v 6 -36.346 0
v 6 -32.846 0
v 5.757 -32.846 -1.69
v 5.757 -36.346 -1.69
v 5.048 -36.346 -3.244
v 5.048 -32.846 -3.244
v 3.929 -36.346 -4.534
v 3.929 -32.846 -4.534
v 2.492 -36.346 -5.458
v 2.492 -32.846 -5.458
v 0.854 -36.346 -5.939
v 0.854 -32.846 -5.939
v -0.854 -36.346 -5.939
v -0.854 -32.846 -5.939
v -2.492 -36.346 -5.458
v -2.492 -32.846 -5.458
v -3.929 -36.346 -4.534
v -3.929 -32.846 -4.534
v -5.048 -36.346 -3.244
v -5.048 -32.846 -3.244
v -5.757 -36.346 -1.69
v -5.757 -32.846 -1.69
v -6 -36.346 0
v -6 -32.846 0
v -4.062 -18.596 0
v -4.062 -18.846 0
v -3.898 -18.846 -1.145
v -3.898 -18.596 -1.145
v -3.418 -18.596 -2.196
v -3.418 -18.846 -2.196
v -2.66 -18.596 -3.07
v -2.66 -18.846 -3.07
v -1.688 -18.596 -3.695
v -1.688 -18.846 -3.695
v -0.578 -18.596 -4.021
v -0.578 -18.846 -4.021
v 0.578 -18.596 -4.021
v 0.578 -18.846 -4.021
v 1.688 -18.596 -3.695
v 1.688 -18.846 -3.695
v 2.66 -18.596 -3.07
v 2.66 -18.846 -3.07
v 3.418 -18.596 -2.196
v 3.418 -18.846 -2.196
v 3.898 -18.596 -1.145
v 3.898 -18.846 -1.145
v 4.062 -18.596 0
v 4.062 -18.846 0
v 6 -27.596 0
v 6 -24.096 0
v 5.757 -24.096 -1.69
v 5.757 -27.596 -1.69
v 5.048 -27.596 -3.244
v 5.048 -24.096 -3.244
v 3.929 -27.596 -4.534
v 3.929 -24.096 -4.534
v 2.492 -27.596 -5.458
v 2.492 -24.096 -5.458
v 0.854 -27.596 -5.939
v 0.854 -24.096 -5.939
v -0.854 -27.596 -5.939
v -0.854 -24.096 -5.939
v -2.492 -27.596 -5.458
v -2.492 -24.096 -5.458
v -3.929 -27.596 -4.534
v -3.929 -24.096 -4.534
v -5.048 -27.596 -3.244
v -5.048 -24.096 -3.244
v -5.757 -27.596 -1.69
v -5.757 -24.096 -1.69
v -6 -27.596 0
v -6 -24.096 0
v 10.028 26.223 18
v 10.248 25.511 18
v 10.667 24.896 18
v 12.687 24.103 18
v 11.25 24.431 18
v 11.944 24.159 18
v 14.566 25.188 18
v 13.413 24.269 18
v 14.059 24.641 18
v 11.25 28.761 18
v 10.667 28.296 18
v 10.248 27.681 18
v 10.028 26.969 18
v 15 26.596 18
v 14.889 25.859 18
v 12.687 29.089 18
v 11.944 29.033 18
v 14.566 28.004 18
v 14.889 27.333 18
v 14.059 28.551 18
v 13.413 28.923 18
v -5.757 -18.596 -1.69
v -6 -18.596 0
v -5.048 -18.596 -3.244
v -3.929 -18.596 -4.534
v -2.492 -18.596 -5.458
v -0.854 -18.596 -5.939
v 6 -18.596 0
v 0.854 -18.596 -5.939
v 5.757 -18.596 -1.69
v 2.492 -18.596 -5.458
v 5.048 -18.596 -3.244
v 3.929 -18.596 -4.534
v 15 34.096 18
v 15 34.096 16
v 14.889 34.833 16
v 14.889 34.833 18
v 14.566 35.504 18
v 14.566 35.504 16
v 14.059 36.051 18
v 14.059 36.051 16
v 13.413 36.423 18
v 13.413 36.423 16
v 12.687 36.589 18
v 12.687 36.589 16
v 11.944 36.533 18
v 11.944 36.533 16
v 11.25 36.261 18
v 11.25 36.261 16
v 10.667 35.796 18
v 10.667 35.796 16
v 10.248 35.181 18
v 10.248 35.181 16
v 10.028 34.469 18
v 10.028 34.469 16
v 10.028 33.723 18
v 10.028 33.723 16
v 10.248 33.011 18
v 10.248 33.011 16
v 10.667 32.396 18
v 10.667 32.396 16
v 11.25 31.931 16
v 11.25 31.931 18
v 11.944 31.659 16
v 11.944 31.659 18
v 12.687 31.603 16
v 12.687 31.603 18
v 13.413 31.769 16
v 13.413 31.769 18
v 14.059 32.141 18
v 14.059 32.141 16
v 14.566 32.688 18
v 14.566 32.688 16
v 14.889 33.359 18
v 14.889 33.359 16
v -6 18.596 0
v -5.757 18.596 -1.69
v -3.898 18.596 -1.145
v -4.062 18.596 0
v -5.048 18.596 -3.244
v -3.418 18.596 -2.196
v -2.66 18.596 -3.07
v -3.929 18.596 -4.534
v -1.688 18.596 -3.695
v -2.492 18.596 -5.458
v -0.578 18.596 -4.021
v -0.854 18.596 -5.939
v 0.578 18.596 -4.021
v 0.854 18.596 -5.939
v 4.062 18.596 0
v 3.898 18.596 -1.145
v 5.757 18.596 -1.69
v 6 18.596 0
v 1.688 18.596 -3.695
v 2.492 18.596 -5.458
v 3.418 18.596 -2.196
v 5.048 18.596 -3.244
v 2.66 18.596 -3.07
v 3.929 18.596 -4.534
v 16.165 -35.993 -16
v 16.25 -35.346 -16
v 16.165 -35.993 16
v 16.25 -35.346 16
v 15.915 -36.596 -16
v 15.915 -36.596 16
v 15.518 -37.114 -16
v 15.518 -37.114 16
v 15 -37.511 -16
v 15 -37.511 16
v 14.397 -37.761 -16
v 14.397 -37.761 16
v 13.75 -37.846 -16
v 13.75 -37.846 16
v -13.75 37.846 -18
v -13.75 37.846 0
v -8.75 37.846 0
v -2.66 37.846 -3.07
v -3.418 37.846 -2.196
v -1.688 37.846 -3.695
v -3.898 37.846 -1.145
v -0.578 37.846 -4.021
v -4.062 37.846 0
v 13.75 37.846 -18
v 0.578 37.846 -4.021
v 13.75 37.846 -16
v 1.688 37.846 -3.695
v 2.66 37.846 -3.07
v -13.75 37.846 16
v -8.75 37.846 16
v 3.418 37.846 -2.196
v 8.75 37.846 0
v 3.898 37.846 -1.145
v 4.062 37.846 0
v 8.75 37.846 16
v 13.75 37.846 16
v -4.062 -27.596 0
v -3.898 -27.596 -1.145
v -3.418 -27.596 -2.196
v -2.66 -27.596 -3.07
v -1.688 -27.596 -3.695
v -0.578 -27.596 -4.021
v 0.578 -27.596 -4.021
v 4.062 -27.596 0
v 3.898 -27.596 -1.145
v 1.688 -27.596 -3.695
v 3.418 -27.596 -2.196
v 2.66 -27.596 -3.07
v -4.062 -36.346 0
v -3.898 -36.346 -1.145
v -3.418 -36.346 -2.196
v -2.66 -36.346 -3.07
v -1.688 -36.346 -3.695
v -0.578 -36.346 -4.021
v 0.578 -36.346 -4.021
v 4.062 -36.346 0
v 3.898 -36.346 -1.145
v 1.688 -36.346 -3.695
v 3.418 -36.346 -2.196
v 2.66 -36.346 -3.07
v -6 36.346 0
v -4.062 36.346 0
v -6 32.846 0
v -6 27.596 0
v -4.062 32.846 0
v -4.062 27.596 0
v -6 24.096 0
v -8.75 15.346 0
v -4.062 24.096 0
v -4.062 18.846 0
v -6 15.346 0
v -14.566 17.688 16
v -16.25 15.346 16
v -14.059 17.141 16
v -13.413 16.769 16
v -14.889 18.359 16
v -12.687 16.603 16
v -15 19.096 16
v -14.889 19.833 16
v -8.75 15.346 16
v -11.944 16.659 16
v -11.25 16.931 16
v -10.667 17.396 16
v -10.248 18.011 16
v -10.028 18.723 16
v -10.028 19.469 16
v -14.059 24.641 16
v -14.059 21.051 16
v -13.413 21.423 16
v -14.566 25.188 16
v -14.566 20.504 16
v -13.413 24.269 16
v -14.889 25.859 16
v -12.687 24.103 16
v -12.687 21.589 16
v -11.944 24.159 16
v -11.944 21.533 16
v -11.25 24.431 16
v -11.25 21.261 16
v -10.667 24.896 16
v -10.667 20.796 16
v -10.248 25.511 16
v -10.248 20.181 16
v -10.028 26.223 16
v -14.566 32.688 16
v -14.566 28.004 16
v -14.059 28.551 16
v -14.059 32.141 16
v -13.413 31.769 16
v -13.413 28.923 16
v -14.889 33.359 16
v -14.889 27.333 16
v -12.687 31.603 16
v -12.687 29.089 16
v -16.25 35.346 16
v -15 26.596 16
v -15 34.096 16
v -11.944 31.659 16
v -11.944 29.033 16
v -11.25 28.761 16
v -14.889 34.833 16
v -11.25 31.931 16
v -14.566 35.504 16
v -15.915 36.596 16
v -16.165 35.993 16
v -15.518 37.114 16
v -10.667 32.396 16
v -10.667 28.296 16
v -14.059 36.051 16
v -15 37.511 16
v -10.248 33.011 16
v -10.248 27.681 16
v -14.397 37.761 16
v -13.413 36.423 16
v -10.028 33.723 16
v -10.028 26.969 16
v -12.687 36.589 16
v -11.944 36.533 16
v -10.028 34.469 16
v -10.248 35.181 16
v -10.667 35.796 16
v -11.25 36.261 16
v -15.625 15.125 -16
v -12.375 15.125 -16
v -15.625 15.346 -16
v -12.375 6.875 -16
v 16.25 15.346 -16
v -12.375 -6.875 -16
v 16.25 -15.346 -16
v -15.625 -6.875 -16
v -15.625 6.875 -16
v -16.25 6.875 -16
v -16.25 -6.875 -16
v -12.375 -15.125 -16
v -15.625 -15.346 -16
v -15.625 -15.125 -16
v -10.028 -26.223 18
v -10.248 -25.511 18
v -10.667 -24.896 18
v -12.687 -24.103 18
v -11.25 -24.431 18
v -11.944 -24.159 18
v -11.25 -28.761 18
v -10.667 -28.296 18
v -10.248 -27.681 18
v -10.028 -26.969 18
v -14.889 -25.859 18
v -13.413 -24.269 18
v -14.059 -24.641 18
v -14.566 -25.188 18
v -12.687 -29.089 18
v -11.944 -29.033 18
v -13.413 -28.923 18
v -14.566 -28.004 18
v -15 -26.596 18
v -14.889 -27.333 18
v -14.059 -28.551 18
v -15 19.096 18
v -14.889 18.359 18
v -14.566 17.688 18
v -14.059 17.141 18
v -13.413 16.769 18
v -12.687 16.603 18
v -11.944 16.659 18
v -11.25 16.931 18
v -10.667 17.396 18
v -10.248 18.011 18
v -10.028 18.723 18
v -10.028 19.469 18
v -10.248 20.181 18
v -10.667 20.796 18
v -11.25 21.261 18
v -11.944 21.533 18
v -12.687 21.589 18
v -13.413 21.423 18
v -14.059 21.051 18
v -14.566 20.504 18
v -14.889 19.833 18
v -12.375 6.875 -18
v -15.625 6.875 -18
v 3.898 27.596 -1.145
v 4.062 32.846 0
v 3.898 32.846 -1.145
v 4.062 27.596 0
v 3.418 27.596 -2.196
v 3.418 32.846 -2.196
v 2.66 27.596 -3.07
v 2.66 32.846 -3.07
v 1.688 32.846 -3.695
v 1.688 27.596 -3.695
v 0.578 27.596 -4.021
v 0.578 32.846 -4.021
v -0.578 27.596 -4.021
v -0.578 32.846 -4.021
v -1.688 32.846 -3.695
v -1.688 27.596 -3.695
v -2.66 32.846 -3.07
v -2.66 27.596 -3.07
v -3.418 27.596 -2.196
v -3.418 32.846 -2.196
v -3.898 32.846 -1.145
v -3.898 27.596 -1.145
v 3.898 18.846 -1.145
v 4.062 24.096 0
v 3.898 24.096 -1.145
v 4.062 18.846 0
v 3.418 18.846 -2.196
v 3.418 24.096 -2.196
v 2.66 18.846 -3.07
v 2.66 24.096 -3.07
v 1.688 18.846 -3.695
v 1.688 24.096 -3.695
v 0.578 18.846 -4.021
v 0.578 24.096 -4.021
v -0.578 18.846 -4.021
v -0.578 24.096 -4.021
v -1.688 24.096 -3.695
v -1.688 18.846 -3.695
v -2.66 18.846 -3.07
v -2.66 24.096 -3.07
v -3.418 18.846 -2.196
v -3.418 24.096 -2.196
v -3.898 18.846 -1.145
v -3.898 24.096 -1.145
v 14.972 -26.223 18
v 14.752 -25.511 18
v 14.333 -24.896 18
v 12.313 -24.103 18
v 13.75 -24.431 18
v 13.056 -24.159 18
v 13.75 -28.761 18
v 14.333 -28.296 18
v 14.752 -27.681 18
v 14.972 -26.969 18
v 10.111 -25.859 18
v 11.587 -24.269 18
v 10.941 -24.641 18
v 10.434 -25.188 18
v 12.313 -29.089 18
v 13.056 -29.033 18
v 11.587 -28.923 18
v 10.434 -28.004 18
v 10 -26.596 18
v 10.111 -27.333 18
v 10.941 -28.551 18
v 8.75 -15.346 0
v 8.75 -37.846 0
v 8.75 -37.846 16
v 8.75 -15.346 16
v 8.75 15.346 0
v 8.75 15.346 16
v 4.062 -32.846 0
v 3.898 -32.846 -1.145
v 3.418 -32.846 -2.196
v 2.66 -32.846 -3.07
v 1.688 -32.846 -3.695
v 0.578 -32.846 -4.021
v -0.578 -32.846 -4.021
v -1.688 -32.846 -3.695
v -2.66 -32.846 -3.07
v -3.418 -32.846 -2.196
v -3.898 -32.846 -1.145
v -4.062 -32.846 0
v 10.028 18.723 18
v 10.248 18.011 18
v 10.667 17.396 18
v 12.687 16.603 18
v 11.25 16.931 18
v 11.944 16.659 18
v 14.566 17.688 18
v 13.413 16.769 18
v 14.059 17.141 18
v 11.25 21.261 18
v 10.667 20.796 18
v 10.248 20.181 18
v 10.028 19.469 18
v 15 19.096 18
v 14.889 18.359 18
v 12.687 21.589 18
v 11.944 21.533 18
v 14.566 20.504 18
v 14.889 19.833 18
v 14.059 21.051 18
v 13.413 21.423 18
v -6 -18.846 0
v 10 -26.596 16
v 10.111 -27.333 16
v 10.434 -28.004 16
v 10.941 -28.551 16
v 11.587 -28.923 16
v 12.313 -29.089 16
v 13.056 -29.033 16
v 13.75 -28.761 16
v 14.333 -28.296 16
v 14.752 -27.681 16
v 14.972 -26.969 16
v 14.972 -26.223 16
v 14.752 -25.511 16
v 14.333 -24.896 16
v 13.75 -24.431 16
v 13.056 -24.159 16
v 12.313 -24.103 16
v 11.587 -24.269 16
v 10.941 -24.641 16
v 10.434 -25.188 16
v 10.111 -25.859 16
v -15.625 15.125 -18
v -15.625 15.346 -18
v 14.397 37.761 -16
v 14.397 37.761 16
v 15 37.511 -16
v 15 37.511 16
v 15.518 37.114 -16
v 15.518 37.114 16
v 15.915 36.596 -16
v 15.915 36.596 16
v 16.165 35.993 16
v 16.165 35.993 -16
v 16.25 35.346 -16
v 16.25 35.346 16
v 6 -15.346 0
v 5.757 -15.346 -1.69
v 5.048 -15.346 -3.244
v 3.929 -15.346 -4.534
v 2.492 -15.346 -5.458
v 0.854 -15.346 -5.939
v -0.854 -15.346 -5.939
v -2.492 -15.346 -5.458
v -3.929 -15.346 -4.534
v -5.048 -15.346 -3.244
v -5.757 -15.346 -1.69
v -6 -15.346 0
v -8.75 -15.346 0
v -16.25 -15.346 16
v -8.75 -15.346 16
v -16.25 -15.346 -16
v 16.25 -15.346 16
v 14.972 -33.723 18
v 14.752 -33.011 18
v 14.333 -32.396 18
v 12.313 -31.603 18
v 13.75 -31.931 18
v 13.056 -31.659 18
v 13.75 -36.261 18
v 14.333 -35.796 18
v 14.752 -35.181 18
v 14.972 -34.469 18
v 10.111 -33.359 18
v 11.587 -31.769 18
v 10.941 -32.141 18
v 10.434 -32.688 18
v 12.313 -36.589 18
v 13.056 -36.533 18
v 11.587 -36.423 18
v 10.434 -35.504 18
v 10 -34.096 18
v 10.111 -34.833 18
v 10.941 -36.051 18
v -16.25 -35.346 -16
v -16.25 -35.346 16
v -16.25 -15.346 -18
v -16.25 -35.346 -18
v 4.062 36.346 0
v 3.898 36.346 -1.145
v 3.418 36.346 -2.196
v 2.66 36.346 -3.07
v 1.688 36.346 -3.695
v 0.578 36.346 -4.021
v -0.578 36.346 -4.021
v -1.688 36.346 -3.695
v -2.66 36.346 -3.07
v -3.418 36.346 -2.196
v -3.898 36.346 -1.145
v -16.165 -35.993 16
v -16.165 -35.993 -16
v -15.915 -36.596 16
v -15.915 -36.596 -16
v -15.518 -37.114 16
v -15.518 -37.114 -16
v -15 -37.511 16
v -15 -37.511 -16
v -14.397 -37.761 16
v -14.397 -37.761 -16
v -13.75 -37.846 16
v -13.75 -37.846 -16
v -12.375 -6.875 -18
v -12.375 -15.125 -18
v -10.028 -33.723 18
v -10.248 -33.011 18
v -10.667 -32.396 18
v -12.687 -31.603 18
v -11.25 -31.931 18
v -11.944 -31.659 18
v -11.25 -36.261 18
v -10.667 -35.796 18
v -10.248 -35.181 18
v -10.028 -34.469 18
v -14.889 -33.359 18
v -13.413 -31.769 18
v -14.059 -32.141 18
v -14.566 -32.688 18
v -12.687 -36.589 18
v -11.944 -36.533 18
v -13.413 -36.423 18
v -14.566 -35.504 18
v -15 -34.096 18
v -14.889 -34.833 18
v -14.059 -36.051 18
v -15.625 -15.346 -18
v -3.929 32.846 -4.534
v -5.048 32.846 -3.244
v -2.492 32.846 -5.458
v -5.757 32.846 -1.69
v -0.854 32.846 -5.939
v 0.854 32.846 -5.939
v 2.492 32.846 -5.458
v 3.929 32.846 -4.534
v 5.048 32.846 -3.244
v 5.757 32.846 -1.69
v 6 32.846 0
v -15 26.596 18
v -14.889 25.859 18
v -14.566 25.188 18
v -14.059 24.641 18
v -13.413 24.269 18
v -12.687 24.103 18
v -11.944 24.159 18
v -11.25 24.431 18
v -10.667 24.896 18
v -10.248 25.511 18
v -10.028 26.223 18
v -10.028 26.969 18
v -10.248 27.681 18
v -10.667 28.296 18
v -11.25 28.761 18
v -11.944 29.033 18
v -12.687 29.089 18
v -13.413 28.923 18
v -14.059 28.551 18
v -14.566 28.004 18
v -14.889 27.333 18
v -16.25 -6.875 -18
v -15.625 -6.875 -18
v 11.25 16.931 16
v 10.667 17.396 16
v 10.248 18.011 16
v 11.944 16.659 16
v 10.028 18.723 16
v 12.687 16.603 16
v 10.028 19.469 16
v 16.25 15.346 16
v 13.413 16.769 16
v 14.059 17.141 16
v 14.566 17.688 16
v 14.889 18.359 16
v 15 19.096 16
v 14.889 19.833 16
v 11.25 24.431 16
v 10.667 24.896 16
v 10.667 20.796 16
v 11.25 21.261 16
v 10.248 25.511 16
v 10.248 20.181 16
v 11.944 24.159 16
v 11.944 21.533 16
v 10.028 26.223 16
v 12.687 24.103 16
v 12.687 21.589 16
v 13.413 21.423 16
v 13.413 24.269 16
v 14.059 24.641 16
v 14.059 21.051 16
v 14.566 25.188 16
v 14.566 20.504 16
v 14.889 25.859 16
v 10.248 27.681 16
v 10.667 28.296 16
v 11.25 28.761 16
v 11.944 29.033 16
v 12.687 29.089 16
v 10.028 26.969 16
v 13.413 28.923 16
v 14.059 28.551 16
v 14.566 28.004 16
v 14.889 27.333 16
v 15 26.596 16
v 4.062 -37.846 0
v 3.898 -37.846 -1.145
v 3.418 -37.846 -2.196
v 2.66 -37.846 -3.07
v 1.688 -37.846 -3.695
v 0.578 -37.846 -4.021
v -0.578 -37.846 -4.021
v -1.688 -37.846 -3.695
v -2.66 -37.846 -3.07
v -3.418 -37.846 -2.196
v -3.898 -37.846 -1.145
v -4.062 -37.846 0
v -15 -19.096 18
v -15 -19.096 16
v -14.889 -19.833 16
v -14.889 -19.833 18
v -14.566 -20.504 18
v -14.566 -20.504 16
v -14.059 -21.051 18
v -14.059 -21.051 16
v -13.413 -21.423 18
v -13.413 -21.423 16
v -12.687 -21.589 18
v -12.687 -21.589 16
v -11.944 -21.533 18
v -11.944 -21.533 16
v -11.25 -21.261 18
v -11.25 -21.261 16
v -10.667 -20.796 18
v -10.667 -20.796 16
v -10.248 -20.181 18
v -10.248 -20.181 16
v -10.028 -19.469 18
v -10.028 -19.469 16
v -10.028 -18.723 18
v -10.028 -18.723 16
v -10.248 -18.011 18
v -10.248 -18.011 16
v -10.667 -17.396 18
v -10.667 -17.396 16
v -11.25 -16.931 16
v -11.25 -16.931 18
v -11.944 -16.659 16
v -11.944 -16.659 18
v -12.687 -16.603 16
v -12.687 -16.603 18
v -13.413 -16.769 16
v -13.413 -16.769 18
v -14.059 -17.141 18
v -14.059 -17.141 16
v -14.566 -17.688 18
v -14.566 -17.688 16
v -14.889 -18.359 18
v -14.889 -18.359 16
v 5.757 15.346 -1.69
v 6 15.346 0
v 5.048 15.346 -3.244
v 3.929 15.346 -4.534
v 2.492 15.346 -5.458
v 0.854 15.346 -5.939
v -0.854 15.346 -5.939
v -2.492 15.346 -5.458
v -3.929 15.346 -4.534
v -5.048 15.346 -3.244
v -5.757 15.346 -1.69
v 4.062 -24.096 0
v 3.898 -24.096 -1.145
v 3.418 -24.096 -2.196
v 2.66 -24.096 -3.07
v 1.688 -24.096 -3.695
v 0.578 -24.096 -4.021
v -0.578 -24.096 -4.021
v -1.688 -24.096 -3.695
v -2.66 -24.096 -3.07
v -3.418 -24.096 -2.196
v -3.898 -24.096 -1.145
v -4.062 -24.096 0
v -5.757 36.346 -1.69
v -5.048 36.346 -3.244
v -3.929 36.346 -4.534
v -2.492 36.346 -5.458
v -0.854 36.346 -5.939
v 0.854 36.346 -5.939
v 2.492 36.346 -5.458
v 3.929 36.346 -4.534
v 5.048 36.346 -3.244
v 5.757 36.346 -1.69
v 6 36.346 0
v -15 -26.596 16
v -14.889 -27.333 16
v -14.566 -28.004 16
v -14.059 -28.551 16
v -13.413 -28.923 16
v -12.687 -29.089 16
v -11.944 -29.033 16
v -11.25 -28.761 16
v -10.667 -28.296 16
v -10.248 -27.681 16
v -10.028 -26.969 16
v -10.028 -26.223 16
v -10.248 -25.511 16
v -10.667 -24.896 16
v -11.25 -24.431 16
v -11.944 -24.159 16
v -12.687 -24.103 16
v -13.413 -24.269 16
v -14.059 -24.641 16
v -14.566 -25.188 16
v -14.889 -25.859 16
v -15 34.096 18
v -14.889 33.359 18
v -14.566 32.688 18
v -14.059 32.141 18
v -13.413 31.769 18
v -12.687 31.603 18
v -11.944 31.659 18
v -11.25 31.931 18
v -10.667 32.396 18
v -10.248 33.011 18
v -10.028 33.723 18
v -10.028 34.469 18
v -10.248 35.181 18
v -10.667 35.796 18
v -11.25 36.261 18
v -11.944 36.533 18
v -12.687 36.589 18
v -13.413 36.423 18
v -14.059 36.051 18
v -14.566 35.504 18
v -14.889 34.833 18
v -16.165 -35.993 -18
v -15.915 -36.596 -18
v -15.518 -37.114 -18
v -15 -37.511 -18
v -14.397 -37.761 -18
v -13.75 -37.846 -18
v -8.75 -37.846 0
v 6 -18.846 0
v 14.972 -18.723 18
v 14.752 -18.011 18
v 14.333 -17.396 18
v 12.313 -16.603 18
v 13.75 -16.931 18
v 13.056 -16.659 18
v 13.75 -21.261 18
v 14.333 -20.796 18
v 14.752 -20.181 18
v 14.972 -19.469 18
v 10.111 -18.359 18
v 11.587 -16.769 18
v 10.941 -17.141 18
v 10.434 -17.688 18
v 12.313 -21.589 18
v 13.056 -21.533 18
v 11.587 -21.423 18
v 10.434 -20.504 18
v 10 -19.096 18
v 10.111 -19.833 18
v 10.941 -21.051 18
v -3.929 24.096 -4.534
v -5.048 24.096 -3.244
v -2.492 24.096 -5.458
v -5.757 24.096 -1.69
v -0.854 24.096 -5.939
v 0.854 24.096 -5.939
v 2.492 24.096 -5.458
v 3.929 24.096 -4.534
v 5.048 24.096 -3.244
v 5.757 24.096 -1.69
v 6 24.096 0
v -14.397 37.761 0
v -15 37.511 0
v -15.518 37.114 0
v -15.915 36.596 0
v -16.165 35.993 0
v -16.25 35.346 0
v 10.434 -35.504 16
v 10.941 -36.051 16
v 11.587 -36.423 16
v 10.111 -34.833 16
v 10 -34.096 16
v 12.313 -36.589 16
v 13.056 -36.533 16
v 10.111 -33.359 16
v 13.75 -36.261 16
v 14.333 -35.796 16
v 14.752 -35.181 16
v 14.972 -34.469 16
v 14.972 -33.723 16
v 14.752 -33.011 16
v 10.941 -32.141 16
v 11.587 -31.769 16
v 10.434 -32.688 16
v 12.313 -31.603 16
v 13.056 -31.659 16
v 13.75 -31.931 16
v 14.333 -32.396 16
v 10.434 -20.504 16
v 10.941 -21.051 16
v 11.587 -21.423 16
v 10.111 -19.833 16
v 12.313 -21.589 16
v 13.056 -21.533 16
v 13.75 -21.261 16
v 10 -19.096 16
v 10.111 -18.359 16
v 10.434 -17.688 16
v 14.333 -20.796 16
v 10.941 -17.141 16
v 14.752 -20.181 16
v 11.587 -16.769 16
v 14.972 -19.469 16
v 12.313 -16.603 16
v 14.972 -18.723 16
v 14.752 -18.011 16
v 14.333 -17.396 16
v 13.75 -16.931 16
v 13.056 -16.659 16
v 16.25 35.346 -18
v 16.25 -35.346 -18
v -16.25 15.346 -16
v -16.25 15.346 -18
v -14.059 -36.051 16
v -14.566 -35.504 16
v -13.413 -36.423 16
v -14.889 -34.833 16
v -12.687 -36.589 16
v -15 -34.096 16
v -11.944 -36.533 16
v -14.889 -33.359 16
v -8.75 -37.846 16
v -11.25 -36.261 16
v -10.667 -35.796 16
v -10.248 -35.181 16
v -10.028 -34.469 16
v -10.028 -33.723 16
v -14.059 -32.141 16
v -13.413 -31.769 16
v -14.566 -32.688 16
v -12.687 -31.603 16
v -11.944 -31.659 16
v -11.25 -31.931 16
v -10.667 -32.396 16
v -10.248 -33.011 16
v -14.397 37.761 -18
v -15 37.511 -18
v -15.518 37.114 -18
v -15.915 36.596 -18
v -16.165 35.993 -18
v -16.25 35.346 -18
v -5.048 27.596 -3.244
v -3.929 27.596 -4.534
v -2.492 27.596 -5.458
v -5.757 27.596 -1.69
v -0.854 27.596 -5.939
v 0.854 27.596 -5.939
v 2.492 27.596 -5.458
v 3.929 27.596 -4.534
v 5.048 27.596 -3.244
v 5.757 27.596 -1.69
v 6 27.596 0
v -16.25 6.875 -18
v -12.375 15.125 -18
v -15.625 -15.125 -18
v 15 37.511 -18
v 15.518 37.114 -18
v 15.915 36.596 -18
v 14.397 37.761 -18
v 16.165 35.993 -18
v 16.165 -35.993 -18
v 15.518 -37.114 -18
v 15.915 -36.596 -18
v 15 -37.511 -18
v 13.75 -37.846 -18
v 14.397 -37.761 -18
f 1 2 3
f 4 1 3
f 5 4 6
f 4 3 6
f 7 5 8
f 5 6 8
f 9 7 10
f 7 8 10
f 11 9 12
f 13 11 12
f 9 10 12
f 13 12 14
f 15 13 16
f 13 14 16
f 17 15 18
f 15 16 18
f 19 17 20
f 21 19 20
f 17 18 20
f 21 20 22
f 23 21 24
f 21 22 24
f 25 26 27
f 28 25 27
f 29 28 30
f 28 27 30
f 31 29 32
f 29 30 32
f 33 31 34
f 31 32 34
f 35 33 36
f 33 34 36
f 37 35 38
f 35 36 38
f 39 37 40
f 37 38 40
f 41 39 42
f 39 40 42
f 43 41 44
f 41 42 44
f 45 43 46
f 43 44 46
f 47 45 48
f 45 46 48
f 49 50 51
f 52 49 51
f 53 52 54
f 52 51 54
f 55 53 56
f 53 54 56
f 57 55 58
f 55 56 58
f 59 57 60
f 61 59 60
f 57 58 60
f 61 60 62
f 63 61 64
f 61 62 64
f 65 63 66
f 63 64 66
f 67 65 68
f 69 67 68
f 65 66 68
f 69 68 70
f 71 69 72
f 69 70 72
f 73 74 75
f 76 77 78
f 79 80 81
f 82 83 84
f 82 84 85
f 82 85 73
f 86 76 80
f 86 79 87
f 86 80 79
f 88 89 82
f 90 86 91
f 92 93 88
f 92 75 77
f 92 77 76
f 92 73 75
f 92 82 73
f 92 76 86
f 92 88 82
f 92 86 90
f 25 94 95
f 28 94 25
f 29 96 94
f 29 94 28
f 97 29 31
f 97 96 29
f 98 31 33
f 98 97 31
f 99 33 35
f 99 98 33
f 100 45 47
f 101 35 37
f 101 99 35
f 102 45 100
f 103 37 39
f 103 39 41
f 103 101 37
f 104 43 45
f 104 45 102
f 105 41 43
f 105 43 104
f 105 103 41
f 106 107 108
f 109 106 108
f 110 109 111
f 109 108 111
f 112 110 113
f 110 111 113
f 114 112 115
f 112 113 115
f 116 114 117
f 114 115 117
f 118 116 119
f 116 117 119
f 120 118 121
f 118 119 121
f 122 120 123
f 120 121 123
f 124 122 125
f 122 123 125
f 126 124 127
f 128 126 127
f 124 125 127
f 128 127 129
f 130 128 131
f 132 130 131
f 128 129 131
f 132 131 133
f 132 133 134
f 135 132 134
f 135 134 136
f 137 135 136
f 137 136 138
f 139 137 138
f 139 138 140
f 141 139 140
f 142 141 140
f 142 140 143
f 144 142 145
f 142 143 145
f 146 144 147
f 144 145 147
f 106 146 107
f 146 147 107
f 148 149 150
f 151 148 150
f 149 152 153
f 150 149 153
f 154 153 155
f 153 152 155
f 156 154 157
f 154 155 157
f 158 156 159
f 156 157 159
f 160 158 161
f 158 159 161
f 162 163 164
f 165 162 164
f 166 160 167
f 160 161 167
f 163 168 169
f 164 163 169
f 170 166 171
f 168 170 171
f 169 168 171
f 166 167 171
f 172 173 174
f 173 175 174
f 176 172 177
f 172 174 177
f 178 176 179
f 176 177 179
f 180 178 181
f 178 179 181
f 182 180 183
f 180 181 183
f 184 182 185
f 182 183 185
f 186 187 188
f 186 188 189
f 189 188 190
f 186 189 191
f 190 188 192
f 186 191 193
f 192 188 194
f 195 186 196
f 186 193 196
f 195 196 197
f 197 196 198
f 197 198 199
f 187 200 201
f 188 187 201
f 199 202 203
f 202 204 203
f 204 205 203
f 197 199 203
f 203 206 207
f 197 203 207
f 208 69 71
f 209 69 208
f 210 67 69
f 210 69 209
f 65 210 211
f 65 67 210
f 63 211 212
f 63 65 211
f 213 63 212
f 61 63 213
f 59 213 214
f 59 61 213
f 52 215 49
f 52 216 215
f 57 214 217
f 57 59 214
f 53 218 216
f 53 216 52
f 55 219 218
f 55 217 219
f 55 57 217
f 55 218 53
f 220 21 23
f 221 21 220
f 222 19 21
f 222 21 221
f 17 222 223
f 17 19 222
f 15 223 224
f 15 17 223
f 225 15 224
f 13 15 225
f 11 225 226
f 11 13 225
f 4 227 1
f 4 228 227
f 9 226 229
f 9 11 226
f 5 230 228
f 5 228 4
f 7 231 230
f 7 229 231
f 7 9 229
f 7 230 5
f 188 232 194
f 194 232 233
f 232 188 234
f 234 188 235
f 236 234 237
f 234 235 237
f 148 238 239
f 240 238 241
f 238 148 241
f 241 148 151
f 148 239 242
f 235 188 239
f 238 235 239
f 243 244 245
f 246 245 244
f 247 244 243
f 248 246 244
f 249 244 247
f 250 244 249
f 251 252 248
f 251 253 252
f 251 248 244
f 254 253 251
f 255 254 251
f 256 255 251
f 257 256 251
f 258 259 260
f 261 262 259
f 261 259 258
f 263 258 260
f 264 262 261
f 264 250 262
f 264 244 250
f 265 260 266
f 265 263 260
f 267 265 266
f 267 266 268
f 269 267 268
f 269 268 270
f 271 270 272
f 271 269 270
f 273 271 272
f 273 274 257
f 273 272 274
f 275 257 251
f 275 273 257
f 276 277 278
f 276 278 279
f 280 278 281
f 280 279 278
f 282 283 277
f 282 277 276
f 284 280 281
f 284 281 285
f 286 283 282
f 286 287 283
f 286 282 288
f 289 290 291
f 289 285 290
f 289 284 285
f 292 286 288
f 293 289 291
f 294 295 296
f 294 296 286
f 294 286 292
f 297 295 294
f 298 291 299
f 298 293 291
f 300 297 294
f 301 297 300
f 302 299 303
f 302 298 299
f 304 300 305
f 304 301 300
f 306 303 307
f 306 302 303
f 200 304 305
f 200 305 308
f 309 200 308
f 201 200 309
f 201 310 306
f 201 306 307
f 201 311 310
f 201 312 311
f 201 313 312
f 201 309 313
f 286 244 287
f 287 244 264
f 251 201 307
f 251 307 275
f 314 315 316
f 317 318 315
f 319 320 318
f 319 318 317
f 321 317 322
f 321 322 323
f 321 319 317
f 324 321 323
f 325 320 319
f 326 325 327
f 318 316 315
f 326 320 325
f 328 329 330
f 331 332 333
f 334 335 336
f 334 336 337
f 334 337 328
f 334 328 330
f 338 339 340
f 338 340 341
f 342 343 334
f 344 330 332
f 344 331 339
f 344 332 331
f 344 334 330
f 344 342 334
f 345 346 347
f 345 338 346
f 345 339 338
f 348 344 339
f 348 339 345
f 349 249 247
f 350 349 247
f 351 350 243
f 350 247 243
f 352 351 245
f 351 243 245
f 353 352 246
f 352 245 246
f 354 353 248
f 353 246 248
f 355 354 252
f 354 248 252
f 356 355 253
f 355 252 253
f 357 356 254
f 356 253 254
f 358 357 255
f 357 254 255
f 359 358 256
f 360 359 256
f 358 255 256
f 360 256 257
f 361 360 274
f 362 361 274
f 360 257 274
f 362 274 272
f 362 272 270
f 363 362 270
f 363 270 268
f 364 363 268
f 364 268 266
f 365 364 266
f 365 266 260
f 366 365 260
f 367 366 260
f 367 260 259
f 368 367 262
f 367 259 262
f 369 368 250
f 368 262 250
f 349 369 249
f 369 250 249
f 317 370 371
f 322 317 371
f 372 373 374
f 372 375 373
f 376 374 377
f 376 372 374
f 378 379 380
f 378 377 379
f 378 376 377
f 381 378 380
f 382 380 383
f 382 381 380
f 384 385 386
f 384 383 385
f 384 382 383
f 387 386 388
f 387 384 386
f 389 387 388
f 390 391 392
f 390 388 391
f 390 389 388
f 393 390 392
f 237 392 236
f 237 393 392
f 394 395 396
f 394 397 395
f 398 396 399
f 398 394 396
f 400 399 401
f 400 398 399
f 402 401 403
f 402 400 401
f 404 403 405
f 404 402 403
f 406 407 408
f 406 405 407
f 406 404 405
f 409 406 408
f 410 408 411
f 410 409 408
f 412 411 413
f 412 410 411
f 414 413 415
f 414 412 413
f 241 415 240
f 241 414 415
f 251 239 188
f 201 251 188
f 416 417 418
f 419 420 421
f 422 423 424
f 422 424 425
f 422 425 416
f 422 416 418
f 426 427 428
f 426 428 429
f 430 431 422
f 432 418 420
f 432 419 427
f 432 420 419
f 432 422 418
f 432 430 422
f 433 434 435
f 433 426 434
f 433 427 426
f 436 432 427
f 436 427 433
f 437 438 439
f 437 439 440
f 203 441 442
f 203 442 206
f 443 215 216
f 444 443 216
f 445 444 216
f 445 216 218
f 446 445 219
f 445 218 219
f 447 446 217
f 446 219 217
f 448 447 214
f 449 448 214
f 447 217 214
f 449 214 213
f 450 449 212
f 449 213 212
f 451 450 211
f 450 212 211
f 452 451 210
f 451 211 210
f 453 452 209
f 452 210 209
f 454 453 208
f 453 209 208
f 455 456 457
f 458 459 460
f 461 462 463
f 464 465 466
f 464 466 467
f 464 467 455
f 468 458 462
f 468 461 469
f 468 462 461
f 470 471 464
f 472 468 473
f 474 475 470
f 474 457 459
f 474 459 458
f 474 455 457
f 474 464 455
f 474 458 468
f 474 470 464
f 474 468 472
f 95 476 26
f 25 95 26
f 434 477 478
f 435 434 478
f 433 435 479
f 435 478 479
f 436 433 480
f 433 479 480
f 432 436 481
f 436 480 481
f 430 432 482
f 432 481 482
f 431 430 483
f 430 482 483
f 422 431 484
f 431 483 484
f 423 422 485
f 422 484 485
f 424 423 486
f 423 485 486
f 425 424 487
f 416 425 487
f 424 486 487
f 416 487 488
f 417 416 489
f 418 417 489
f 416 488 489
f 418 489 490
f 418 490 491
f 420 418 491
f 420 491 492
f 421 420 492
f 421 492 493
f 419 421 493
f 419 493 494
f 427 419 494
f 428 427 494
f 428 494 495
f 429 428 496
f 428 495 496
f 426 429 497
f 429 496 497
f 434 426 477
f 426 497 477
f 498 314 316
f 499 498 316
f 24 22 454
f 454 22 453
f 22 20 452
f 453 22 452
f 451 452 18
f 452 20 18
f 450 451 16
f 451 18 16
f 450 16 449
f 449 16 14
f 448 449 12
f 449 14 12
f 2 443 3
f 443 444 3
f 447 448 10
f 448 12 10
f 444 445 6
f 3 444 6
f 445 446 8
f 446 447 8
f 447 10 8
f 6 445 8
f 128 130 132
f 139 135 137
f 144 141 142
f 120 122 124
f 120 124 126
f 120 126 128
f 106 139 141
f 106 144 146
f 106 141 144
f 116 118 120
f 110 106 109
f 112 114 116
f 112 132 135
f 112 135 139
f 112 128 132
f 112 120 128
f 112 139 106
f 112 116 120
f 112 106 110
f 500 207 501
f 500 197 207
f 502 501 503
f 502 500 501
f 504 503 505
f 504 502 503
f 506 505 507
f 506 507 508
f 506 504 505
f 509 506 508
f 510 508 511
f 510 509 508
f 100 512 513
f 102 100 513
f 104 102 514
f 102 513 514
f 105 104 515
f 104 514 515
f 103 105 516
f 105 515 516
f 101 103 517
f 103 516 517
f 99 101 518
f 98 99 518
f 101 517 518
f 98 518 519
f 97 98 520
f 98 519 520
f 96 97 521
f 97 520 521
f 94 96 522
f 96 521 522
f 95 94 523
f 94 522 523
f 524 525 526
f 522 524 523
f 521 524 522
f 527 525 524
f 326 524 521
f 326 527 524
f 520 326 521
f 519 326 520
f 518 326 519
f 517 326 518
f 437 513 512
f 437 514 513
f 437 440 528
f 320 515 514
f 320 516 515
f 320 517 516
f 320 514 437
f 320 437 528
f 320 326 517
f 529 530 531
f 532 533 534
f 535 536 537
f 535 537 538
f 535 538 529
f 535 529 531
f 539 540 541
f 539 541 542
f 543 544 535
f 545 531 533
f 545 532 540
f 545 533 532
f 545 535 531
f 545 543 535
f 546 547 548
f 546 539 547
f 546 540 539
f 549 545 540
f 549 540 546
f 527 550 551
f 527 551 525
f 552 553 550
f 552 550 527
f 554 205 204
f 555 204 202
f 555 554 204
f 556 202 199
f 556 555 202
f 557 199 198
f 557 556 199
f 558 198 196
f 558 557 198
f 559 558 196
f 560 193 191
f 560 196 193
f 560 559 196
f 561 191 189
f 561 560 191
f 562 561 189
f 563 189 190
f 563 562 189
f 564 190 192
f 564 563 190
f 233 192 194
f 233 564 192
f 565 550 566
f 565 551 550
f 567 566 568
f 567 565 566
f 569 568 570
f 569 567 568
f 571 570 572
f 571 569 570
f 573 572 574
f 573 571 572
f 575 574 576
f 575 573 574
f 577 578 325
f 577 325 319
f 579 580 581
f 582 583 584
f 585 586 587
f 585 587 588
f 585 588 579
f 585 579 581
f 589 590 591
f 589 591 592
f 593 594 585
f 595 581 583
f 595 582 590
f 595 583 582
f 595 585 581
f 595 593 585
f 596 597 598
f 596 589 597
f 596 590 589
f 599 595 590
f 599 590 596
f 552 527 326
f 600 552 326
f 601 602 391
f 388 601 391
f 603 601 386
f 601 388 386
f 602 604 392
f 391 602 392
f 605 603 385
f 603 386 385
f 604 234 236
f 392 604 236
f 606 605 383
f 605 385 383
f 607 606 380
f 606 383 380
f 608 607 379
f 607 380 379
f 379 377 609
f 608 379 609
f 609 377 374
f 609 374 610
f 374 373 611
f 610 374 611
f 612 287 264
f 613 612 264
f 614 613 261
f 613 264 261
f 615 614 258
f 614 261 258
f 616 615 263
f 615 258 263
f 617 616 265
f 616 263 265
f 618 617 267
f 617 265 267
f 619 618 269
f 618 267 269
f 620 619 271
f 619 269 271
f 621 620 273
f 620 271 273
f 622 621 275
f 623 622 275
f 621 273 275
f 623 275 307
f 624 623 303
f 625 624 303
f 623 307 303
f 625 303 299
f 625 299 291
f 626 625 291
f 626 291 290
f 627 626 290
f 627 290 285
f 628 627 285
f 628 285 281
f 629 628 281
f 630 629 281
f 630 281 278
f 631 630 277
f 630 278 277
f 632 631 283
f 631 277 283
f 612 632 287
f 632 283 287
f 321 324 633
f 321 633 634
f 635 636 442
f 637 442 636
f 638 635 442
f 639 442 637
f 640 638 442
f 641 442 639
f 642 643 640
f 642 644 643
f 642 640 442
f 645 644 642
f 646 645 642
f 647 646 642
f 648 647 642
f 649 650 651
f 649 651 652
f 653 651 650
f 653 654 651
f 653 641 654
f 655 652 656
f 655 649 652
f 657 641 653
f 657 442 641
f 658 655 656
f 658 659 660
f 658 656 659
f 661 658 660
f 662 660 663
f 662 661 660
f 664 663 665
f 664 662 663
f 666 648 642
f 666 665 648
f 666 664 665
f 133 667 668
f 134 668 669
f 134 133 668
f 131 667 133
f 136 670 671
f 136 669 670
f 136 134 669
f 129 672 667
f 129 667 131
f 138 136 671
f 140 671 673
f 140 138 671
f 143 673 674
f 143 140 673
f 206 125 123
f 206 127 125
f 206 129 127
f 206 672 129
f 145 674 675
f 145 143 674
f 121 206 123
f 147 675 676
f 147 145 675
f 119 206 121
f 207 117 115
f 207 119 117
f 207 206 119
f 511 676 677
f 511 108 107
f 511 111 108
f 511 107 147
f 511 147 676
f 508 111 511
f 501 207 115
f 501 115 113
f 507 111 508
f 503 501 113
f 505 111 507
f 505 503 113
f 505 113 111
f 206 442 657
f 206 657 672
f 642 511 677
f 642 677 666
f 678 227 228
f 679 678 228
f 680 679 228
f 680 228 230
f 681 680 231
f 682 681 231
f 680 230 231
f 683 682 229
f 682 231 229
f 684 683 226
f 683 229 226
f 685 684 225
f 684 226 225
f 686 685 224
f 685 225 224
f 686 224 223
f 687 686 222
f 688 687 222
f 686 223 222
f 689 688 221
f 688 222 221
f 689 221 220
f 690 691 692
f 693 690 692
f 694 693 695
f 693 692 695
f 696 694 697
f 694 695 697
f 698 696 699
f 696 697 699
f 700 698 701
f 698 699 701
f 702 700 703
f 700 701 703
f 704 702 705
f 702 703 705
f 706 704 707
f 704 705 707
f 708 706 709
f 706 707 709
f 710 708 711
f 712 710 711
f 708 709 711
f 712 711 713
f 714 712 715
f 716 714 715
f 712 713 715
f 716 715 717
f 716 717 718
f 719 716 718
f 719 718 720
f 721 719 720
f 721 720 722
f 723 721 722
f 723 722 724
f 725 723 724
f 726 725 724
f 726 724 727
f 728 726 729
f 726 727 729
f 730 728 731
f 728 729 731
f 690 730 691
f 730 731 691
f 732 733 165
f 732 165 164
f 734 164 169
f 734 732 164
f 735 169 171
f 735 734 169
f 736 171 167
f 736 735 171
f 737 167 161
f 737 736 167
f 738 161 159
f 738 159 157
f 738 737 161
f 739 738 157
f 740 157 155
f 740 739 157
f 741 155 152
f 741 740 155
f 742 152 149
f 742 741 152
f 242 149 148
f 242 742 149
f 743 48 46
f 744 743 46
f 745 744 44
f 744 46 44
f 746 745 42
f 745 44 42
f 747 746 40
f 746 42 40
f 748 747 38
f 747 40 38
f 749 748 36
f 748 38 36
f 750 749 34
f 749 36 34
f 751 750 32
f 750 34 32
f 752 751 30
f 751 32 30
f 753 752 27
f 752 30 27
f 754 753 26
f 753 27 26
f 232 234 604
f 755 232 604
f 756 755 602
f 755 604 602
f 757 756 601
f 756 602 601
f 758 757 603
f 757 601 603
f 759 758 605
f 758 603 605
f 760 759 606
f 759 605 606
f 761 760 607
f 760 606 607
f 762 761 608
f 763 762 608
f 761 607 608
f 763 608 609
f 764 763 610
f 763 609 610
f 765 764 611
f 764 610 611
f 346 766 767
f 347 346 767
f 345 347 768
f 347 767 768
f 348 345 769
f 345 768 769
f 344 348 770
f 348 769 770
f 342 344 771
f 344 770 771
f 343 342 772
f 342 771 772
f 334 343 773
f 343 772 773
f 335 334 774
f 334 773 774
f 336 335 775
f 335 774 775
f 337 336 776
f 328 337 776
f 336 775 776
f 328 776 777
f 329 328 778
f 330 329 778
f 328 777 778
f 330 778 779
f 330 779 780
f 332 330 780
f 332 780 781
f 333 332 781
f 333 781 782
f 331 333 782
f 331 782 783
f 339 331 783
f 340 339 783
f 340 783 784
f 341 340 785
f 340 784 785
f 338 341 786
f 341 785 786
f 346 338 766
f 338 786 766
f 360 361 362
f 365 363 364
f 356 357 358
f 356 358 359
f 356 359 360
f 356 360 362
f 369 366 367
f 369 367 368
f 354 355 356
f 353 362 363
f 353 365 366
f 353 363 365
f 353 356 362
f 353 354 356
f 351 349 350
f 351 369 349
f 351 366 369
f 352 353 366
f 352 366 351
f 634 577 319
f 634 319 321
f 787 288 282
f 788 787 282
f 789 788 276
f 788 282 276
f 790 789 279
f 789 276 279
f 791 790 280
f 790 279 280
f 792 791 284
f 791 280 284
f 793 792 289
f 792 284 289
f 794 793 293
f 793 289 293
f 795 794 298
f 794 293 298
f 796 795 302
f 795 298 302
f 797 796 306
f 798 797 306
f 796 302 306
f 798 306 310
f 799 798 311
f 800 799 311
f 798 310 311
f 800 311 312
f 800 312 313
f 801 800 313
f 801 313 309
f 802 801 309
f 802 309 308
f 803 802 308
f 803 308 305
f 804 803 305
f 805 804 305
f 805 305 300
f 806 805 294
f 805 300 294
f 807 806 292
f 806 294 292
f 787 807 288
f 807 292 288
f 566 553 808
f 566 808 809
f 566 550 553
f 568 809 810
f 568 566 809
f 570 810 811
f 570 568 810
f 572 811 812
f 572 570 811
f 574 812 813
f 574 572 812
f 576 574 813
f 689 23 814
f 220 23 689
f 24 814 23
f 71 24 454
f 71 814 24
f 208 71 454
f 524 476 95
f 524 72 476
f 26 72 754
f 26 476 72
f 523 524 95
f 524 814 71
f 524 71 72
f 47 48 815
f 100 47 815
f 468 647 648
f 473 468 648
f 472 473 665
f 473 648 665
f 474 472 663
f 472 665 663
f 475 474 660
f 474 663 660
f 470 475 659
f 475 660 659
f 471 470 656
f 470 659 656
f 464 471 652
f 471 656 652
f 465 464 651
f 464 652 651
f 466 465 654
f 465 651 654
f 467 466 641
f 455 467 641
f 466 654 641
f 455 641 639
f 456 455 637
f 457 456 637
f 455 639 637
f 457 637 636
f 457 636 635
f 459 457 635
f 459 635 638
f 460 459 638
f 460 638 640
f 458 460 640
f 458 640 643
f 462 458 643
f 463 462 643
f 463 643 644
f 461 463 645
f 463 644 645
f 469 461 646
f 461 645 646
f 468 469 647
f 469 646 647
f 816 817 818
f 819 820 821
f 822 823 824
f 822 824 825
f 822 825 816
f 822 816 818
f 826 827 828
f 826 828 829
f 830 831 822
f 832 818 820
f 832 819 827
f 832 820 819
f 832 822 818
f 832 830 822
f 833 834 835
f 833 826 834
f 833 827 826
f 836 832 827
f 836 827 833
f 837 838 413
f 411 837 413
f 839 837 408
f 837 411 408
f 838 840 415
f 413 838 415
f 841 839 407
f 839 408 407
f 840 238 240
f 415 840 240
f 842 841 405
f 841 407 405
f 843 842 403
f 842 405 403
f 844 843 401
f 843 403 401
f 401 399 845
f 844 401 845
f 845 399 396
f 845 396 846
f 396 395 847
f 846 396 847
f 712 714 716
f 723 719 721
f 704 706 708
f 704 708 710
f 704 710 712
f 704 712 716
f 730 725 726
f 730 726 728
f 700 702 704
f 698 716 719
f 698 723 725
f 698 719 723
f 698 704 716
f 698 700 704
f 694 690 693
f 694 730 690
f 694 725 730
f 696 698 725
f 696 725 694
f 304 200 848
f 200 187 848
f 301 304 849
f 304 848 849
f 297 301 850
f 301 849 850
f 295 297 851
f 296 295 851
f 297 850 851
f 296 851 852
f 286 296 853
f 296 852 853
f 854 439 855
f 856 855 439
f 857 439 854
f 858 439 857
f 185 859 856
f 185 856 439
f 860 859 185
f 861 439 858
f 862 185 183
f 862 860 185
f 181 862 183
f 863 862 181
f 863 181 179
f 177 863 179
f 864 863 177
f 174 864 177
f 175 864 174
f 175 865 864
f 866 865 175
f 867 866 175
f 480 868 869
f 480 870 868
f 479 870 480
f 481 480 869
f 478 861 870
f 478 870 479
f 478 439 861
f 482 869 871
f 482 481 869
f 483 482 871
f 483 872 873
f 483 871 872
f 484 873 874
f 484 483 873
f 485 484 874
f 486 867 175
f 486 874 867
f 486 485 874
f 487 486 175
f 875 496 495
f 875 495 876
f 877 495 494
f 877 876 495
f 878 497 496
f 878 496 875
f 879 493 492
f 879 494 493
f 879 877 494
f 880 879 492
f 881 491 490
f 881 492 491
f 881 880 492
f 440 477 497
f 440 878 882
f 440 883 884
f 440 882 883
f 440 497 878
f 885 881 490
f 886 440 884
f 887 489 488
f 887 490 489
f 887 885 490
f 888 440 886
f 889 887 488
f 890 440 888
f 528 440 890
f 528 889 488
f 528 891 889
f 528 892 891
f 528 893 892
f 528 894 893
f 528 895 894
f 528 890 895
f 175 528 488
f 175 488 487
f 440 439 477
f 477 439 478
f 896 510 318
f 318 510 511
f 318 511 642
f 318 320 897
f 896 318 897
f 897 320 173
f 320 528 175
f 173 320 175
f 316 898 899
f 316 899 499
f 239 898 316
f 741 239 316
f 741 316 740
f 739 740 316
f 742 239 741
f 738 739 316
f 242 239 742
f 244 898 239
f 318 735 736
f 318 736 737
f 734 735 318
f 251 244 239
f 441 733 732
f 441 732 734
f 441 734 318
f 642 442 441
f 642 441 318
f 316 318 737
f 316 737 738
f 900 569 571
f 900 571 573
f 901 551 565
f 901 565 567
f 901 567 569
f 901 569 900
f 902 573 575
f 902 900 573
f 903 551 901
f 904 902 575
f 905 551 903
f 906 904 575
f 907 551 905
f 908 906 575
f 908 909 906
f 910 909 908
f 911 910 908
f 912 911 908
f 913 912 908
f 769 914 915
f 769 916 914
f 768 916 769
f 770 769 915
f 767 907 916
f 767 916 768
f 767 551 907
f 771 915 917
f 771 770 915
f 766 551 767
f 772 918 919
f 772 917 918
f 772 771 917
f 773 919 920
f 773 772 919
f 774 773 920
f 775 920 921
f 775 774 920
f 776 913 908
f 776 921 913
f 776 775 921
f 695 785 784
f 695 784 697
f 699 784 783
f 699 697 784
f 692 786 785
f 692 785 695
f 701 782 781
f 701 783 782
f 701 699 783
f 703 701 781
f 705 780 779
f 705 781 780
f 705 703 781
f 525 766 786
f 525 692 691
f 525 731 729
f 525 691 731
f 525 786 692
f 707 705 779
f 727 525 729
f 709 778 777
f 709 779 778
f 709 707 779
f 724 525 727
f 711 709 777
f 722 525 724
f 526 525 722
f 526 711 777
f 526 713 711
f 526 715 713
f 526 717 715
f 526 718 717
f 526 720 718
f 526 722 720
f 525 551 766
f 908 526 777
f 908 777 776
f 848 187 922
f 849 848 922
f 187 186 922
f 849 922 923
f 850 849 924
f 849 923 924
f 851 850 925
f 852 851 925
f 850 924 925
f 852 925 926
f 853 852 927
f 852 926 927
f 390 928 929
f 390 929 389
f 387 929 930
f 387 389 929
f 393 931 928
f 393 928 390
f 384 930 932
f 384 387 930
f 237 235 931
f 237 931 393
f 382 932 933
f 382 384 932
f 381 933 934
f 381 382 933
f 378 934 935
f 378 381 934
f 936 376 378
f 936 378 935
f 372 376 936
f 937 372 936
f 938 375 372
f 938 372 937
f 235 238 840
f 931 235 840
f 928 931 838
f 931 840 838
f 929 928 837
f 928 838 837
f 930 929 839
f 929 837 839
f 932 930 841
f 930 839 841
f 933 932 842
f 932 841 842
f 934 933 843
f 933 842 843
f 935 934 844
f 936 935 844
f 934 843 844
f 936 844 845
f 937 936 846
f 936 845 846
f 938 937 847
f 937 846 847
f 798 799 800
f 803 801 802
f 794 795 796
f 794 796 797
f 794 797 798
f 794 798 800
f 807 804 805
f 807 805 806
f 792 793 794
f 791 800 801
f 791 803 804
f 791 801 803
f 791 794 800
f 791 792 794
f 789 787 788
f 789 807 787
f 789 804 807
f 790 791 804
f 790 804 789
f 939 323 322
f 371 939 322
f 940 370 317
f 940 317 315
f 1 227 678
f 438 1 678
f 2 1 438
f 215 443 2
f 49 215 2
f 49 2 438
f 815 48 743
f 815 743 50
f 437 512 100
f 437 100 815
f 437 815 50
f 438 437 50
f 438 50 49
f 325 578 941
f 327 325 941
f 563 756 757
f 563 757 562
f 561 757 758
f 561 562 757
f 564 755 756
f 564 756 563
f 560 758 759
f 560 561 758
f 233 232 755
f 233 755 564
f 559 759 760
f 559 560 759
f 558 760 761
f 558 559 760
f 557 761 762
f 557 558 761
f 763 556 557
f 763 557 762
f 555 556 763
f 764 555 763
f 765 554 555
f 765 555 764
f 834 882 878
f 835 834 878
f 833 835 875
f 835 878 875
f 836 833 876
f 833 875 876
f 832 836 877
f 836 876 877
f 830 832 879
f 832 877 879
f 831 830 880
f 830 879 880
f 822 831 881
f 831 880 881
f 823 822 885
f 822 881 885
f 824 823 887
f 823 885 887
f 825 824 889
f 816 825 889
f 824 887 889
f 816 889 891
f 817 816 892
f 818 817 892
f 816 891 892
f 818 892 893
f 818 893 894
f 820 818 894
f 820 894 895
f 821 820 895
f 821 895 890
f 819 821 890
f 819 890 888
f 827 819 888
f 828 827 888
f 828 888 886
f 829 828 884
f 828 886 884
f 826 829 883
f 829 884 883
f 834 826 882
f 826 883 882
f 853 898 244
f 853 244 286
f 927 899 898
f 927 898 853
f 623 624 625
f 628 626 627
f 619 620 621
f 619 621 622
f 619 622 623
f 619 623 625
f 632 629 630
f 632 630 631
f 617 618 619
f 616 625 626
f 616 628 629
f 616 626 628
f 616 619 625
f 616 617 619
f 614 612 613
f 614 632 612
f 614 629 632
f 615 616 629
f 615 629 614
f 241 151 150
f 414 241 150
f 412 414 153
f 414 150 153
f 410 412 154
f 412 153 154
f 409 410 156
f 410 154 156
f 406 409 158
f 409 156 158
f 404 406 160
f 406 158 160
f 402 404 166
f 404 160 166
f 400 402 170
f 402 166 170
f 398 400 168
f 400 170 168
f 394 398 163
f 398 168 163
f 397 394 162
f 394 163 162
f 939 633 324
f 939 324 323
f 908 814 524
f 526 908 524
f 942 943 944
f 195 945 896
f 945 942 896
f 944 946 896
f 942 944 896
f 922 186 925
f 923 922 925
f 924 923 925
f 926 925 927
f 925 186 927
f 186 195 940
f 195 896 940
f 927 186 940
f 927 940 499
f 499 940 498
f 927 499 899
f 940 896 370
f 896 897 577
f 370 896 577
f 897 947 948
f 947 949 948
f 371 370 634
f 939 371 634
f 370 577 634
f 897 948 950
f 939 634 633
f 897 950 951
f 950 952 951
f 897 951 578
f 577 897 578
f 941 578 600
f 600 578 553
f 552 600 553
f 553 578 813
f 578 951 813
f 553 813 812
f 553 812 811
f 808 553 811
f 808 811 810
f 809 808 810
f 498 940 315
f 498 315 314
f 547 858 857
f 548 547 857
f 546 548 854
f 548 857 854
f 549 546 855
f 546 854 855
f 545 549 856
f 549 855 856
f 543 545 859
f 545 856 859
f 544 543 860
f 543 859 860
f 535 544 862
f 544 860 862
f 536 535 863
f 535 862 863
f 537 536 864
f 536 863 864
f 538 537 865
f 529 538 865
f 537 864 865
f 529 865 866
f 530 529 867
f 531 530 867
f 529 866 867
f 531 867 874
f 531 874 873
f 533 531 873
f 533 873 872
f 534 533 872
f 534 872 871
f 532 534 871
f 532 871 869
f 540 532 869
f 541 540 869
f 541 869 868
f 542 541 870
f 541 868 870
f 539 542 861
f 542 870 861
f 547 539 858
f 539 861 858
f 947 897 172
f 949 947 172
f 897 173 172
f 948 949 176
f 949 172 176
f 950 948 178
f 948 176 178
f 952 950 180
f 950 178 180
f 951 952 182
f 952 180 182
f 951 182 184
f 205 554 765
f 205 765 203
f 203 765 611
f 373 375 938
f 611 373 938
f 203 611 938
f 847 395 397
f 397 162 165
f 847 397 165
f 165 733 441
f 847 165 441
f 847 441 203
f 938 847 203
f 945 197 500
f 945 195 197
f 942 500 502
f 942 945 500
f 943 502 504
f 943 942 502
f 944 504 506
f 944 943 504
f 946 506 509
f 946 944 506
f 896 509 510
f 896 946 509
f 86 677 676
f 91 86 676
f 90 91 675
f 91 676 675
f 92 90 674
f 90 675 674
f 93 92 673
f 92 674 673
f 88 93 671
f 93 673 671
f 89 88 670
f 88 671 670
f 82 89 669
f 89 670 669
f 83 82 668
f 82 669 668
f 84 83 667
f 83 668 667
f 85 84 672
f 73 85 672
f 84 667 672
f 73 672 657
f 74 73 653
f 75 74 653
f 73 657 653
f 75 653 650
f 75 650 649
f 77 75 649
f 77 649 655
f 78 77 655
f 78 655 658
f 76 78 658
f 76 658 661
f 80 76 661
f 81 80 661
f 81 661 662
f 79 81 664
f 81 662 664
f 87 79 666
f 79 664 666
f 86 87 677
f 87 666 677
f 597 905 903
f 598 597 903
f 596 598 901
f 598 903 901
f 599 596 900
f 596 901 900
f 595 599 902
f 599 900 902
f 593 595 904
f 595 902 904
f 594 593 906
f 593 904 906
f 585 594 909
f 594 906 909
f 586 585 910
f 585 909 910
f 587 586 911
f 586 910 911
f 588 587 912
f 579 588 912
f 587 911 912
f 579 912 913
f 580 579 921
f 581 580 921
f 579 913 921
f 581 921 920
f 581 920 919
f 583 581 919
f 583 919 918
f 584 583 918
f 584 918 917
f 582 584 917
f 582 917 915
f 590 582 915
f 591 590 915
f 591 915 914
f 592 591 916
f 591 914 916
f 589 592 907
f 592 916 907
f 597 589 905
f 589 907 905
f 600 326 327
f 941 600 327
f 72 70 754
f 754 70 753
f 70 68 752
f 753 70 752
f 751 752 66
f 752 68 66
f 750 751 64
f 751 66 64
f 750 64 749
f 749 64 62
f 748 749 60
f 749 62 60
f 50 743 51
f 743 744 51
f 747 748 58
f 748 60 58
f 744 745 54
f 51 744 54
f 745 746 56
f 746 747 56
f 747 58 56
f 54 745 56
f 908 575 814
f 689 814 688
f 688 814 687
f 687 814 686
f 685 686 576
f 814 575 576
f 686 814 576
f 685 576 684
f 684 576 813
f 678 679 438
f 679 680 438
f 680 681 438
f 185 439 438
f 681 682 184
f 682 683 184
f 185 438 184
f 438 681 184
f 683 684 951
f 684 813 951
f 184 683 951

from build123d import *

# Parameters (mm, degrees)
SKETCH1_W                 = 32.5
SKETCH1_H                 = 22.5
BOSS_EXTRUDE1_DEPTH       = 16
SKETCH2_W                 = 32.5
SKETCH2_H                 = 37.845937441
BOSS_EXTRUDE2_DEPTH       = 2
CUT_EXTRUDE2_DEPTH        = 59.458857784
SKETCH3_R                 = 6
SKETCH3_R_2               = 4.0625
CUT_EXTRUDE1_DEPTH        = 3.5
LPATTERN1_COUNT           = 3
LPATTERN1_PITCH           = 8.75
MIRROR7_COPY_1_SKETCH_R   = 6
MIRROR7_COPY_1_SKETCH_R_2 = 4.0625
MIRROR7_COPY_1_DEPTH      = 3.5
MIRROR7_COPY_2_SKETCH_R   = 6
MIRROR7_COPY_2_SKETCH_R_2 = 4.0625
MIRROR7_COPY_2_DEPTH      = 3.5
MIRROR7_COPY_3_SKETCH_R   = 6
MIRROR7_COPY_3_SKETCH_R_2 = 4.0625
MIRROR7_COPY_3_DEPTH      = 3.5
SKETCH5_W                 = 7.5
SKETCH5_H                 = 22.5
BOSS_EXTRUDE6_DEPTH       = 16
SKETCH6_R                 = 2.5
BOSS_EXTRUDE7_DEPTH       = 2
SKETCH7_W                 = 3.25
SKETCH7_H                 = 8.25
CUT_EXTRUDE3_DEPTH        = 10
LPATTERN2_COUNT           = 2
LPATTERN2_PITCH           = 7.5
LPATTERN3_COUNT           = 2
LPATTERN3_PITCH           = 7.5
BOSS_EXTRUDE8_START       = -18.845937441
BOSS_EXTRUDE8_DEPTH       = 0.25
BOSS_EXTRUDE9_START       = 18.595937441
BOSS_EXTRUDE9_DEPTH       = 0.25
FILLET1_R                 = 2.5
SKETCH10_W                = 0.625
SKETCH10_H                = 8.470937441
CUT_EXTRUDE4_DEPTH        = 54.407653766


# Read off the part's stored shape, not the designer's step: Boss-Extrude8, Boss-Extrude9
with BuildPart() as part:
    # Sketch1 → Boss-Extrude1 (new body)
    with BuildSketch(Plane.XY):
        with Locations((0, -26.595937441)):
            Rectangle(SKETCH1_W, SKETCH1_H)
    boss_extrude1 = extrude(amount=-BOSS_EXTRUDE1_DEPTH)

    # Sketch2 → Boss-Extrude2 (add)
    with BuildSketch(Plane(origin=(0, 0, -16), x_dir=(-1, 0, 0), z_dir=(0, 0, -1))):
        with Locations((0, -18.922968721)):
            Rectangle(SKETCH2_W, SKETCH2_H)
    boss_extrude2 = extrude(amount=BOSS_EXTRUDE2_DEPTH)

    # Mirror4: Boss-Extrude2 across plane
    add(boss_extrude2.mirror(Plane(origin=(-16.25, 0, -18), x_dir=(0, 0, 1), z_dir=(0, -1, 0))))

    # Mirror5: Boss-Extrude1 across plane
    add(boss_extrude1.mirror(Plane.ZX))

    # Sketch3<3> → Cut-Extrude2 (cut, through all)
    with BuildSketch(Plane(origin=(0, -15.345937441, 0), x_dir=(1, 0, 0), z_dir=(0, 1, 0))):
        with BuildLine():
            Line((-4.0625, 0), (4.0625, 0))
            ThreePointArc((4.0625, 0), (0, 4.0625), (-4.0625, 0))
        make_face()
        with BuildLine():
            ThreePointArc((-4.0625, 0), (0, -4.0625), (4.0625, 0))
            Line((4.0625, 0), (-4.0625, 0))
        make_face()
    cut_extrude2 = extrude(amount=-CUT_EXTRUDE2_DEPTH, mode=Mode.SUBTRACT)

    # Sketch3 → Cut-Extrude1 (cut)
    with BuildSketch(Plane(origin=(0, -15.345937441, 0), x_dir=(1, 0, 0), z_dir=(0, 1, 0))):
        Circle(SKETCH3_R)
        Circle(SKETCH3_R_2, mode=Mode.SUBTRACT)
    cut_extrude1 = extrude(amount=-CUT_EXTRUDE1_DEPTH, mode=Mode.SUBTRACT)

    # LPattern1: Cut-Extrude1 ×3
    with Locations(*[(0, -i * LPATTERN1_PITCH, 0) for i in range(1, LPATTERN1_COUNT)]):
        add(cut_extrude1, mode=Mode.SUBTRACT)

    # Mirror6: Cut-Extrude2, Cut-Extrude1 across plane
    add(cut_extrude2.mirror(Plane.ZX), mode=Mode.SUBTRACT)
    add(cut_extrude1.mirror(Plane.ZX), mode=Mode.SUBTRACT)

    # Mirror6 at the second plane: Cut-Extrude2, Cut-Extrude1 across plane
    add(cut_extrude2.mirror(Plane.XY), mode=Mode.SUBTRACT)
    add(cut_extrude1.mirror(Plane.XY), mode=Mode.SUBTRACT)

    # Mirror7 copy 1 sketch → Mirror7 copy 1 (cut)
    with BuildSketch(Plane.XZ.offset(-24.095937441)):
        Circle(MIRROR7_COPY_1_SKETCH_R)
        Circle(MIRROR7_COPY_1_SKETCH_R_2, mode=Mode.SUBTRACT)
    extrude(amount=-MIRROR7_COPY_1_DEPTH, mode=Mode.SUBTRACT)

    # Mirror7 copy 2 sketch → Mirror7 copy 2 (cut)
    with BuildSketch(Plane.XZ.offset(-32.845937441)):
        Circle(MIRROR7_COPY_2_SKETCH_R)
        Circle(MIRROR7_COPY_2_SKETCH_R_2, mode=Mode.SUBTRACT)
    extrude(amount=-MIRROR7_COPY_2_DEPTH, mode=Mode.SUBTRACT)

    # Mirror7 copy 3 sketch → Mirror7 copy 3 (cut)
    with BuildSketch(Plane.XZ.offset(-15.345937441)):
        Circle(MIRROR7_COPY_3_SKETCH_R)
        Circle(MIRROR7_COPY_3_SKETCH_R_2, mode=Mode.SUBTRACT)
    extrude(amount=-MIRROR7_COPY_3_DEPTH, mode=Mode.SUBTRACT)

    # Sketch5 → Boss-Extrude6 (add)
    with BuildSketch(Plane.XY):
        with Locations((-12.5, -26.595937441)):
            Rectangle(SKETCH5_W, SKETCH5_H)
        with Locations((12.5, -26.595937441)):
            Rectangle(SKETCH5_W, SKETCH5_H)
        with Locations((12.5, 26.595937441)):
            Rectangle(SKETCH5_W, SKETCH5_H)
        with Locations((-12.5, 26.595937441)):
            Rectangle(SKETCH5_W, SKETCH5_H)
    extrude(amount=BOSS_EXTRUDE6_DEPTH)

    # Sketch6 → Boss-Extrude7 (add)
    with BuildSketch(Plane.XY.offset(16)):
        with Locations(Location((-12.5, -26.595937441, 0), (0, 0, 180))):
            Circle(SKETCH6_R)
        with Locations(Location((-12.5, 26.595937441, 0), (0, 0, 180))):
            Circle(SKETCH6_R)
        with Locations((12.5, 26.595937441)):
            Circle(SKETCH6_R)
        with Locations(Location((12.5, -26.595937441, 0), (0, 0, 180))):
            Circle(SKETCH6_R)
    boss_extrude7 = extrude(amount=BOSS_EXTRUDE7_DEPTH)

    # Sketch7 → Cut-Extrude3 (cut)
    with BuildSketch(Plane(origin=(0, 0, -18), x_dir=(-1, 0, 0), z_dir=(0, 0, -1))):
        with Locations((14, -11)):
            Rectangle(SKETCH7_W, SKETCH7_H)
        with Locations((14, 11)):
            Rectangle(SKETCH7_W, SKETCH7_H)
    extrude(amount=-CUT_EXTRUDE3_DEPTH, mode=Mode.SUBTRACT)

    # LPattern2: Boss-Extrude7 ×2
    with Locations(*[(0, -i * LPATTERN2_PITCH, 0) for i in range(1, LPATTERN2_COUNT)]):
        add(boss_extrude7)

    # LPattern3: Boss-Extrude7 ×2
    with Locations(*[(0, i * LPATTERN3_PITCH, 0) for i in range(1, LPATTERN3_COUNT)]):
        add(boss_extrude7)

    # Boss-Extrude8 outline → Boss-Extrude8 (add)
    with BuildSketch(Plane(origin=(0, 0, 0), x_dir=(1, 0, 0), z_dir=(0, 1, 0)).offset(BOSS_EXTRUDE8_START)):
        with BuildLine():
            ThreePointArc((-4.0625, 0), (0, 4.0625), (4.0625, 0))
            Line((4.0625, 0), (6, 0))
            ThreePointArc((6, 0), (0, 6), (-6, 0))
            Line((-6, 0), (-4.0625, 0))
        make_face()
    extrude(amount=BOSS_EXTRUDE8_DEPTH)

    # Boss-Extrude9 outline → Boss-Extrude9 (add)
    with BuildSketch(Plane(origin=(0, 0, 0), x_dir=(1, 0, 0), z_dir=(0, 1, 0)).offset(BOSS_EXTRUDE9_START)):
        with BuildLine():
            ThreePointArc((6, 0), (0, 6), (-6, 0))
            Line((-6, 0), (-4.0625, 0))
            ThreePointArc((-4.0625, 0), (0, 4.0625), (4.0625, 0))
            Line((4.0625, 0), (6, 0))
        make_face()
    extrude(amount=BOSS_EXTRUDE9_DEPTH)

    # Fillet1
    fillet1_edges = [part.edges().sort_by_distance(p)[0] for p in [
        (-16.25, 37.845937441, -1),
        (16.25, 37.845937441, -1),
        (16.25, -37.845937441, -1),
        (-16.25, -37.845937441, -1),
    ]]
    fillet(fillet1_edges, radius=FILLET1_R)

    # Sketch10 → Cut-Extrude4 (cut, through all)
    with BuildSketch(Plane.XY.offset(-16)):
        with Locations((-15.9375, 11.110468721)):
            Rectangle(SKETCH10_W, SKETCH10_H)
        with Locations((-15.9375, -11.110468721)):
            Rectangle(SKETCH10_W, SKETCH10_H)
    extrude(amount=-CUT_EXTRUDE4_DEPTH, mode=Mode.SUBTRACT)


solid = part.part
